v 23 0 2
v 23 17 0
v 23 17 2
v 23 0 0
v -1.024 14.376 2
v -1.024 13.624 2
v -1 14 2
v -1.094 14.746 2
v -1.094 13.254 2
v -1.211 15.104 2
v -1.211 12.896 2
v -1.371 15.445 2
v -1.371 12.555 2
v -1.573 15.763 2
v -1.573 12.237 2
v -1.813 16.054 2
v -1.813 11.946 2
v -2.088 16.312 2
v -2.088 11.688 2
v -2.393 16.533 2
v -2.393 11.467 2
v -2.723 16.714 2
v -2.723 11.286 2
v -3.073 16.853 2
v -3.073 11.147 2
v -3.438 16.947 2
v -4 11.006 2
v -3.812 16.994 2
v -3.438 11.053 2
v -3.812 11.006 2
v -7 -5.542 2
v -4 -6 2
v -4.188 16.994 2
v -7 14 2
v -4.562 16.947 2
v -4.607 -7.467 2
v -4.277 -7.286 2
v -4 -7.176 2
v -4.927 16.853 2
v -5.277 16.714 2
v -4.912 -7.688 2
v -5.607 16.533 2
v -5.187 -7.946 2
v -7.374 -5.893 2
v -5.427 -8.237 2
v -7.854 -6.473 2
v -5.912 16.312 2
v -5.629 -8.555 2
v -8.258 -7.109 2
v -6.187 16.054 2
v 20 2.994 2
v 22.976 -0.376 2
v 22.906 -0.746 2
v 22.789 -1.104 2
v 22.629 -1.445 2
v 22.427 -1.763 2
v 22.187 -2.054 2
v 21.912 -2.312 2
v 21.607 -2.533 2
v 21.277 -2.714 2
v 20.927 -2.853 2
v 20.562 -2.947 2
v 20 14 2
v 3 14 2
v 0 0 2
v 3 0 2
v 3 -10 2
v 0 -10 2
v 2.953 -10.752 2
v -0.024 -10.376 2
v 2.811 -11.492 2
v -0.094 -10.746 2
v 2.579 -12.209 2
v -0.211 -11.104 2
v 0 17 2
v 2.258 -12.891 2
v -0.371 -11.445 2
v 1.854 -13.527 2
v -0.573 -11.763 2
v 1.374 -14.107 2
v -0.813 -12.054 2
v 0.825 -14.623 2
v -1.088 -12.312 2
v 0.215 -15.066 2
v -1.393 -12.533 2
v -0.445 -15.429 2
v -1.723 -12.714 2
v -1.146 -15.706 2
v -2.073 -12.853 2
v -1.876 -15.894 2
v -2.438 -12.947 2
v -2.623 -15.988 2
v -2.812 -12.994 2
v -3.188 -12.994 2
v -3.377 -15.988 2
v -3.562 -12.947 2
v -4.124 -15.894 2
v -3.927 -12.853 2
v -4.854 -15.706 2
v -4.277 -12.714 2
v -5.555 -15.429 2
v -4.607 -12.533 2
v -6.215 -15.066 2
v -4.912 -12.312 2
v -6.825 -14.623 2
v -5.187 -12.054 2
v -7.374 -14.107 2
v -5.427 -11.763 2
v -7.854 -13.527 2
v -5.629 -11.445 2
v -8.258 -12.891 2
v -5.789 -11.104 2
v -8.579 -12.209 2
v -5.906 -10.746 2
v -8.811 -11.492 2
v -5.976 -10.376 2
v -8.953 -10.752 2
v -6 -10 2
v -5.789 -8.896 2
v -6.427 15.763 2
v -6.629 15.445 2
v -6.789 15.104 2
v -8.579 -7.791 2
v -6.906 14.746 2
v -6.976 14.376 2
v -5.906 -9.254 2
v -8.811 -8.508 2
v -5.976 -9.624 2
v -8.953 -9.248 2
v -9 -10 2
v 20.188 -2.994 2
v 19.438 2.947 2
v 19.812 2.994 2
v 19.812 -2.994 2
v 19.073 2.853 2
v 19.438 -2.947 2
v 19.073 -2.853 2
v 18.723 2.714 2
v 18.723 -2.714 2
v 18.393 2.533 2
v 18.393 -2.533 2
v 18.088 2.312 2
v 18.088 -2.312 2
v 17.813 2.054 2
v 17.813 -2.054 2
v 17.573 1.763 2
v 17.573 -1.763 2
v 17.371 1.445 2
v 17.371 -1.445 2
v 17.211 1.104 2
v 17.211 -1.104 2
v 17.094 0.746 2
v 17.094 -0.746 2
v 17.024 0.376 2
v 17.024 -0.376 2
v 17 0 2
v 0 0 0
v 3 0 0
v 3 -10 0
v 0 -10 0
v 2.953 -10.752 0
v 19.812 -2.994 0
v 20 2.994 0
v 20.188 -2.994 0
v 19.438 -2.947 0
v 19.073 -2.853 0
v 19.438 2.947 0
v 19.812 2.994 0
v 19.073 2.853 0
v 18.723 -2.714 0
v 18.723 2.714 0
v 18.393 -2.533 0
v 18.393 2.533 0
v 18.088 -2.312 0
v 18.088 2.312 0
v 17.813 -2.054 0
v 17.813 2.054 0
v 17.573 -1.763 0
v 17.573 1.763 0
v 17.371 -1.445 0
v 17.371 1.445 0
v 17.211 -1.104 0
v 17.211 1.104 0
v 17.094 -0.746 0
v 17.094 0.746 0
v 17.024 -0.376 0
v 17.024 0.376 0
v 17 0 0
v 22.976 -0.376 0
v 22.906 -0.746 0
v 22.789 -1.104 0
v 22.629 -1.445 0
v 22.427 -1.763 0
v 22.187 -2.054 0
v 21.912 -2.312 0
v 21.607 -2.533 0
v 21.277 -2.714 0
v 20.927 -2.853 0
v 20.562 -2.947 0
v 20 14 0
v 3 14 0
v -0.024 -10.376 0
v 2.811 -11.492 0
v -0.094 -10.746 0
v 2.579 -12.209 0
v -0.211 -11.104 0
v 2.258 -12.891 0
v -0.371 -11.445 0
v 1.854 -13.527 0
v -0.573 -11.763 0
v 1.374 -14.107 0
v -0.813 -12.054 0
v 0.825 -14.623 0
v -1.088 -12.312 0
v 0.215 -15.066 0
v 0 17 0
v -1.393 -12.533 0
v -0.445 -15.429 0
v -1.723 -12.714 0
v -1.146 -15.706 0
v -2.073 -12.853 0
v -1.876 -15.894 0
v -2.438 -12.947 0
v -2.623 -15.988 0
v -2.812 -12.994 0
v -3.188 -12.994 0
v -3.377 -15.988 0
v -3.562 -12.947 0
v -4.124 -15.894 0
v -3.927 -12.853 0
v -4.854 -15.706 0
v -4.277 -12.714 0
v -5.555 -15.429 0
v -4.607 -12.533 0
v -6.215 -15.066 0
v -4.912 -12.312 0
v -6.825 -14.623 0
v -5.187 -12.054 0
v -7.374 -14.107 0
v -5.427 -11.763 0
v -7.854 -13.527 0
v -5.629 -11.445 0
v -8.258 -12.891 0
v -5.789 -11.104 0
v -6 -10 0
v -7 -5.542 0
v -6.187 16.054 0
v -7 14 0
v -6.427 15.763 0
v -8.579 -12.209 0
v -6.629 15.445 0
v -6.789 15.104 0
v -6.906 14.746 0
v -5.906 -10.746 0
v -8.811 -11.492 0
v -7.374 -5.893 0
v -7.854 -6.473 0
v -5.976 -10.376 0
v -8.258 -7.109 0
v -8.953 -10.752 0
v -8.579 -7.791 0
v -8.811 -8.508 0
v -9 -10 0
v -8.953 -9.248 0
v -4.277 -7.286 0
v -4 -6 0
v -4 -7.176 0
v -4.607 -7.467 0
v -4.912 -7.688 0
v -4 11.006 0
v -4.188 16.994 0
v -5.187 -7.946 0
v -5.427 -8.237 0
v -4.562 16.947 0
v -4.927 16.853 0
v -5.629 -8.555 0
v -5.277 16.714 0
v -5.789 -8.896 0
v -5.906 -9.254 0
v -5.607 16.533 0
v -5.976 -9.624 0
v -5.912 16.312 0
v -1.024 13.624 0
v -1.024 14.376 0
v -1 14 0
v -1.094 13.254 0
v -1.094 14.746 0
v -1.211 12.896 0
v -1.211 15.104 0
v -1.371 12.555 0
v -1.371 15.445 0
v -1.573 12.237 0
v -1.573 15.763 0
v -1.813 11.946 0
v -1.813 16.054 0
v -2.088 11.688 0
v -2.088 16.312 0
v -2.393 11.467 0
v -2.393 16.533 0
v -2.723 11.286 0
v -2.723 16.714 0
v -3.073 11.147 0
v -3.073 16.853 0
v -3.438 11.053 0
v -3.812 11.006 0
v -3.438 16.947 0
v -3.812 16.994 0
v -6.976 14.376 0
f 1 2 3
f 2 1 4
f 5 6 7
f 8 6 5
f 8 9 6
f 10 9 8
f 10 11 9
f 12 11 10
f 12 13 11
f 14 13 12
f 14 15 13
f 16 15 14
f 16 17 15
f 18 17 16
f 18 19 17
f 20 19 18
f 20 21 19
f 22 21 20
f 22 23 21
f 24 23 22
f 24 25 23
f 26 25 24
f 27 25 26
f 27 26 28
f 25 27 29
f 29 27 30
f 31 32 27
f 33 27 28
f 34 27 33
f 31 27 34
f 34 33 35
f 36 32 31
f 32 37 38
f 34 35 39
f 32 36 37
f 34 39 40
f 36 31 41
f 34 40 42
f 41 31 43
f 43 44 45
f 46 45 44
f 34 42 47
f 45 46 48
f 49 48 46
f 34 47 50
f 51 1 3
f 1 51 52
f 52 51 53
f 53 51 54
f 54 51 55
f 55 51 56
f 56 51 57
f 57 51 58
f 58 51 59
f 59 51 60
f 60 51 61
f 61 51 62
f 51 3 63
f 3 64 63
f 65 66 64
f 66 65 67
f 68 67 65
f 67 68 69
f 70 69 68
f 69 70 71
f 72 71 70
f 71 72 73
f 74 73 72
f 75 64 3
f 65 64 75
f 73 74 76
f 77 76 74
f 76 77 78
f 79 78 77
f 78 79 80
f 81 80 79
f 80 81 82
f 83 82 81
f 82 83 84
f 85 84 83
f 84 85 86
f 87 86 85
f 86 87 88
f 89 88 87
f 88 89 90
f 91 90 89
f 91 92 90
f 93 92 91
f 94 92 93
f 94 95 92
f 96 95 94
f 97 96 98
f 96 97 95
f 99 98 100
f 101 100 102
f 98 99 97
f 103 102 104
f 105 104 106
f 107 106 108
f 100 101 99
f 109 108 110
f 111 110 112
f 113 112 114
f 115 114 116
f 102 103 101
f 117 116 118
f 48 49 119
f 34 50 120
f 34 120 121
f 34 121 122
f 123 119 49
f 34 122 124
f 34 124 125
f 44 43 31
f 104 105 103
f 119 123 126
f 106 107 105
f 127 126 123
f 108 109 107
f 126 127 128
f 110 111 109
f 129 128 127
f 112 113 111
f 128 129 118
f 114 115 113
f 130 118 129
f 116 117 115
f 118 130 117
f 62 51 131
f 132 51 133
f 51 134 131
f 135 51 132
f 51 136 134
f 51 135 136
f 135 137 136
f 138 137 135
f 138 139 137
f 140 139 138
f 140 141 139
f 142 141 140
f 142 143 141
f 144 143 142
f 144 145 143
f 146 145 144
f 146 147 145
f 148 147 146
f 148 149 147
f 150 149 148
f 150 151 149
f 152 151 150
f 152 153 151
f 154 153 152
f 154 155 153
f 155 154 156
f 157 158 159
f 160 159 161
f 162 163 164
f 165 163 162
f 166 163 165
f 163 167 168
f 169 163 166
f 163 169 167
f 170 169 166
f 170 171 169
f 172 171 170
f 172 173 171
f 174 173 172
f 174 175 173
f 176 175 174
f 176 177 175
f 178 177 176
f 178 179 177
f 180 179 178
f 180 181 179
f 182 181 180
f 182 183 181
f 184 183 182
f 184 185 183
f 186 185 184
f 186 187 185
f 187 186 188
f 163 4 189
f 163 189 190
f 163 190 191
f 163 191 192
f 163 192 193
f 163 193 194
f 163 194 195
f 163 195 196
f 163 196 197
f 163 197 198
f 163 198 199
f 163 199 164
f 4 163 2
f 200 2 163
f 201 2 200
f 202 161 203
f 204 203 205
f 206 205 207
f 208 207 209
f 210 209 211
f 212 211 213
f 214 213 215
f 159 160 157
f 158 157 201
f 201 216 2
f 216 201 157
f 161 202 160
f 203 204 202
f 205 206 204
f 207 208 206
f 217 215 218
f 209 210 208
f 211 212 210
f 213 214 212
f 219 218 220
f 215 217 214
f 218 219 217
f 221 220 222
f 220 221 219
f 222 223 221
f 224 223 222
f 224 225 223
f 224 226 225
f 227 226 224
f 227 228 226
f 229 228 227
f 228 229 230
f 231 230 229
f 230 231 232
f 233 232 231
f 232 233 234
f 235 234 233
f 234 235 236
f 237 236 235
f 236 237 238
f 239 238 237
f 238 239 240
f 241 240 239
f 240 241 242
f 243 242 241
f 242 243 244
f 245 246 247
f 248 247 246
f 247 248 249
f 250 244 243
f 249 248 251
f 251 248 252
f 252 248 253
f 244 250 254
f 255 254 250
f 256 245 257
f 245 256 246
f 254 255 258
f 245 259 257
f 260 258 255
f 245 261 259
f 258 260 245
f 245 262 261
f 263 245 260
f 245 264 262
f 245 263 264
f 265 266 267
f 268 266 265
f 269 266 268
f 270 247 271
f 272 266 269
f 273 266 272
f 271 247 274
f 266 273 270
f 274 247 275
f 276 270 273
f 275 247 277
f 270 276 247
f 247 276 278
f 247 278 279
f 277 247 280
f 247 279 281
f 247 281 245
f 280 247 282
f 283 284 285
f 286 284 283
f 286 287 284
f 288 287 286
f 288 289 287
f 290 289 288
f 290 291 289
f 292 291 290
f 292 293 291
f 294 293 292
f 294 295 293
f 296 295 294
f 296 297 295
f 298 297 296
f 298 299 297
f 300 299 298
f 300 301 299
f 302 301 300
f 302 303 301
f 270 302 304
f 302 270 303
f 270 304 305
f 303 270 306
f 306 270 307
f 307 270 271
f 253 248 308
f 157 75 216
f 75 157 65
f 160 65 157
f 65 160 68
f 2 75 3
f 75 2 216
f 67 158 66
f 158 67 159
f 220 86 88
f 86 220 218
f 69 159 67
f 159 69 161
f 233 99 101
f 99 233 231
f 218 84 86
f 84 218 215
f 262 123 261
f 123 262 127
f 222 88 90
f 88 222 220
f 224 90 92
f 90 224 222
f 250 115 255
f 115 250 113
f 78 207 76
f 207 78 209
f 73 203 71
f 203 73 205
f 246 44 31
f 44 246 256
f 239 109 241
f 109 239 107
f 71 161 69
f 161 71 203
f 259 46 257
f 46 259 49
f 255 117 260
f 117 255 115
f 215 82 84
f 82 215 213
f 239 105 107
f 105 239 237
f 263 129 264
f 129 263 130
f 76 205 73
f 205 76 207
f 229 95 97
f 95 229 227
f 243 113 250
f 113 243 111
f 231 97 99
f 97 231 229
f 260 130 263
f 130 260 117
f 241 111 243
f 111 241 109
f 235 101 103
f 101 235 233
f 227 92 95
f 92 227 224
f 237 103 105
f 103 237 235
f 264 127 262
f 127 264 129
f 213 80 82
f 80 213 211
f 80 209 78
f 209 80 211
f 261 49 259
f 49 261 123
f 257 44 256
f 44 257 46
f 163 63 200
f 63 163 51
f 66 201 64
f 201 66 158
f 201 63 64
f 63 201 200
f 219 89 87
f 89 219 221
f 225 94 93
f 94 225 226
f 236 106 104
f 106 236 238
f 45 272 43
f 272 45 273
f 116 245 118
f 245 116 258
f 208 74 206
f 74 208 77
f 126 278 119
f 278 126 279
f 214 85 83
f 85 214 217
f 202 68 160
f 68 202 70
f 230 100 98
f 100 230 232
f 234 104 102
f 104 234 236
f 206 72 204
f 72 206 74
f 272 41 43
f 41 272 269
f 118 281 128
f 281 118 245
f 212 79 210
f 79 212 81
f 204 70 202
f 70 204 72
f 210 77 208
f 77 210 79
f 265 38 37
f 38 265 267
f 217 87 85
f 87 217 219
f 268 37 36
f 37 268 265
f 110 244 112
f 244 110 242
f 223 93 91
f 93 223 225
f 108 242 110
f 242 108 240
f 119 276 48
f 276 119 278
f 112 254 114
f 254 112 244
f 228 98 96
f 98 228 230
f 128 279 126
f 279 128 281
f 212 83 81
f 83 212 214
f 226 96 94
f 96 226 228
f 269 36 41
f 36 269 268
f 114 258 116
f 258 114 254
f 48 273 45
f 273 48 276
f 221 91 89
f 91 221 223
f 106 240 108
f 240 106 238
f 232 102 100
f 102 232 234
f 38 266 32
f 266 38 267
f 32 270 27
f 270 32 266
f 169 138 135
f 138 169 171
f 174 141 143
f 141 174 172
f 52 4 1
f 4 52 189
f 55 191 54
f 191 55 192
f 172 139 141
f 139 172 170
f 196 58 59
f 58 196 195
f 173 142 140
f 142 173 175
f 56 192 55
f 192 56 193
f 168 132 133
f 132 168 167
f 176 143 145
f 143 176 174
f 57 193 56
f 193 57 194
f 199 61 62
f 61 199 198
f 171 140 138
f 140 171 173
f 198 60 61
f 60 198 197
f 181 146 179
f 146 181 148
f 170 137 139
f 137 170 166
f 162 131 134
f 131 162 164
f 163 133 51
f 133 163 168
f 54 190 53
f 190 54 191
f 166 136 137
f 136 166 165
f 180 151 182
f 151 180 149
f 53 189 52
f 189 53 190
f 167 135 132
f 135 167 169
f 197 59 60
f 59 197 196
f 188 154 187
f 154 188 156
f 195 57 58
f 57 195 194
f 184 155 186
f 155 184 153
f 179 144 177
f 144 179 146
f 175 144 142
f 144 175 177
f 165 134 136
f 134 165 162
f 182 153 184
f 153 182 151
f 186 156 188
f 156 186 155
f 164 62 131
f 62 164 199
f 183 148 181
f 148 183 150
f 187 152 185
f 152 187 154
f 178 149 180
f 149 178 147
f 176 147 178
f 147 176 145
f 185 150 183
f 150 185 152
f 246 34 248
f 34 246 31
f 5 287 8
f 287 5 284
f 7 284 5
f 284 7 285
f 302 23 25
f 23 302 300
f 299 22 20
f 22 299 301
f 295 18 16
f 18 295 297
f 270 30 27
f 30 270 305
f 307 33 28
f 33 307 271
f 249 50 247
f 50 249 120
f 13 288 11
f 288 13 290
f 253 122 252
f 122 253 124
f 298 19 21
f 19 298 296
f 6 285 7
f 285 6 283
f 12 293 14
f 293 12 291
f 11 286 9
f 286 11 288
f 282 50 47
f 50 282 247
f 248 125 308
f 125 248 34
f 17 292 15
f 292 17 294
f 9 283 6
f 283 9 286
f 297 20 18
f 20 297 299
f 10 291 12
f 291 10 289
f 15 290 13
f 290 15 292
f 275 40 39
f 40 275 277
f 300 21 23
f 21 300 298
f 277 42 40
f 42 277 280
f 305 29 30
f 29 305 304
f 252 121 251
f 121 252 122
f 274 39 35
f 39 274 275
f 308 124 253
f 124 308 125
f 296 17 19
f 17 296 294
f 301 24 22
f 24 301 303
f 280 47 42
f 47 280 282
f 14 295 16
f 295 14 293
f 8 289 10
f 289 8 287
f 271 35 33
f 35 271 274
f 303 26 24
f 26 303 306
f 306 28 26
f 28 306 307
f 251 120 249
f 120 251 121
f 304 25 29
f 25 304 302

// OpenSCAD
//17
//14

$fn=50;
module mod1 () {
	difference () {
		union () {
			cube ([23,17,2]);
			translate([0,-10,0]) cube ([3,10,2]);
		//	translate ([0.35,-10,0]) cylinder (r=1.7, h=2);
		//	translate ([-1,-11,0]) rotate ([0,0,30]) { 
		//		cube ([2,10,2]);
		//		translate ([1,10,0]) cylinder (r=1, h=2);
		//	}
			translate ([-3,-10,0]) cylinder (r=6, h=2);
		}
		translate ([3,0,0]) cube ([17,14,2]);
		translate ([-3,-10,0]) cylinder (r=3, h=2);
		translate ([-4,-10,0]) cube ([4,10,2]);
	}
	translate ([20,0,0]) cylinder(r=3, h=2);
	translate ([-7,-6,0]) cube ([3,20,2]);
	translate ([-4,14,0]) cylinder (r=3, h=2);
}

mod1();
